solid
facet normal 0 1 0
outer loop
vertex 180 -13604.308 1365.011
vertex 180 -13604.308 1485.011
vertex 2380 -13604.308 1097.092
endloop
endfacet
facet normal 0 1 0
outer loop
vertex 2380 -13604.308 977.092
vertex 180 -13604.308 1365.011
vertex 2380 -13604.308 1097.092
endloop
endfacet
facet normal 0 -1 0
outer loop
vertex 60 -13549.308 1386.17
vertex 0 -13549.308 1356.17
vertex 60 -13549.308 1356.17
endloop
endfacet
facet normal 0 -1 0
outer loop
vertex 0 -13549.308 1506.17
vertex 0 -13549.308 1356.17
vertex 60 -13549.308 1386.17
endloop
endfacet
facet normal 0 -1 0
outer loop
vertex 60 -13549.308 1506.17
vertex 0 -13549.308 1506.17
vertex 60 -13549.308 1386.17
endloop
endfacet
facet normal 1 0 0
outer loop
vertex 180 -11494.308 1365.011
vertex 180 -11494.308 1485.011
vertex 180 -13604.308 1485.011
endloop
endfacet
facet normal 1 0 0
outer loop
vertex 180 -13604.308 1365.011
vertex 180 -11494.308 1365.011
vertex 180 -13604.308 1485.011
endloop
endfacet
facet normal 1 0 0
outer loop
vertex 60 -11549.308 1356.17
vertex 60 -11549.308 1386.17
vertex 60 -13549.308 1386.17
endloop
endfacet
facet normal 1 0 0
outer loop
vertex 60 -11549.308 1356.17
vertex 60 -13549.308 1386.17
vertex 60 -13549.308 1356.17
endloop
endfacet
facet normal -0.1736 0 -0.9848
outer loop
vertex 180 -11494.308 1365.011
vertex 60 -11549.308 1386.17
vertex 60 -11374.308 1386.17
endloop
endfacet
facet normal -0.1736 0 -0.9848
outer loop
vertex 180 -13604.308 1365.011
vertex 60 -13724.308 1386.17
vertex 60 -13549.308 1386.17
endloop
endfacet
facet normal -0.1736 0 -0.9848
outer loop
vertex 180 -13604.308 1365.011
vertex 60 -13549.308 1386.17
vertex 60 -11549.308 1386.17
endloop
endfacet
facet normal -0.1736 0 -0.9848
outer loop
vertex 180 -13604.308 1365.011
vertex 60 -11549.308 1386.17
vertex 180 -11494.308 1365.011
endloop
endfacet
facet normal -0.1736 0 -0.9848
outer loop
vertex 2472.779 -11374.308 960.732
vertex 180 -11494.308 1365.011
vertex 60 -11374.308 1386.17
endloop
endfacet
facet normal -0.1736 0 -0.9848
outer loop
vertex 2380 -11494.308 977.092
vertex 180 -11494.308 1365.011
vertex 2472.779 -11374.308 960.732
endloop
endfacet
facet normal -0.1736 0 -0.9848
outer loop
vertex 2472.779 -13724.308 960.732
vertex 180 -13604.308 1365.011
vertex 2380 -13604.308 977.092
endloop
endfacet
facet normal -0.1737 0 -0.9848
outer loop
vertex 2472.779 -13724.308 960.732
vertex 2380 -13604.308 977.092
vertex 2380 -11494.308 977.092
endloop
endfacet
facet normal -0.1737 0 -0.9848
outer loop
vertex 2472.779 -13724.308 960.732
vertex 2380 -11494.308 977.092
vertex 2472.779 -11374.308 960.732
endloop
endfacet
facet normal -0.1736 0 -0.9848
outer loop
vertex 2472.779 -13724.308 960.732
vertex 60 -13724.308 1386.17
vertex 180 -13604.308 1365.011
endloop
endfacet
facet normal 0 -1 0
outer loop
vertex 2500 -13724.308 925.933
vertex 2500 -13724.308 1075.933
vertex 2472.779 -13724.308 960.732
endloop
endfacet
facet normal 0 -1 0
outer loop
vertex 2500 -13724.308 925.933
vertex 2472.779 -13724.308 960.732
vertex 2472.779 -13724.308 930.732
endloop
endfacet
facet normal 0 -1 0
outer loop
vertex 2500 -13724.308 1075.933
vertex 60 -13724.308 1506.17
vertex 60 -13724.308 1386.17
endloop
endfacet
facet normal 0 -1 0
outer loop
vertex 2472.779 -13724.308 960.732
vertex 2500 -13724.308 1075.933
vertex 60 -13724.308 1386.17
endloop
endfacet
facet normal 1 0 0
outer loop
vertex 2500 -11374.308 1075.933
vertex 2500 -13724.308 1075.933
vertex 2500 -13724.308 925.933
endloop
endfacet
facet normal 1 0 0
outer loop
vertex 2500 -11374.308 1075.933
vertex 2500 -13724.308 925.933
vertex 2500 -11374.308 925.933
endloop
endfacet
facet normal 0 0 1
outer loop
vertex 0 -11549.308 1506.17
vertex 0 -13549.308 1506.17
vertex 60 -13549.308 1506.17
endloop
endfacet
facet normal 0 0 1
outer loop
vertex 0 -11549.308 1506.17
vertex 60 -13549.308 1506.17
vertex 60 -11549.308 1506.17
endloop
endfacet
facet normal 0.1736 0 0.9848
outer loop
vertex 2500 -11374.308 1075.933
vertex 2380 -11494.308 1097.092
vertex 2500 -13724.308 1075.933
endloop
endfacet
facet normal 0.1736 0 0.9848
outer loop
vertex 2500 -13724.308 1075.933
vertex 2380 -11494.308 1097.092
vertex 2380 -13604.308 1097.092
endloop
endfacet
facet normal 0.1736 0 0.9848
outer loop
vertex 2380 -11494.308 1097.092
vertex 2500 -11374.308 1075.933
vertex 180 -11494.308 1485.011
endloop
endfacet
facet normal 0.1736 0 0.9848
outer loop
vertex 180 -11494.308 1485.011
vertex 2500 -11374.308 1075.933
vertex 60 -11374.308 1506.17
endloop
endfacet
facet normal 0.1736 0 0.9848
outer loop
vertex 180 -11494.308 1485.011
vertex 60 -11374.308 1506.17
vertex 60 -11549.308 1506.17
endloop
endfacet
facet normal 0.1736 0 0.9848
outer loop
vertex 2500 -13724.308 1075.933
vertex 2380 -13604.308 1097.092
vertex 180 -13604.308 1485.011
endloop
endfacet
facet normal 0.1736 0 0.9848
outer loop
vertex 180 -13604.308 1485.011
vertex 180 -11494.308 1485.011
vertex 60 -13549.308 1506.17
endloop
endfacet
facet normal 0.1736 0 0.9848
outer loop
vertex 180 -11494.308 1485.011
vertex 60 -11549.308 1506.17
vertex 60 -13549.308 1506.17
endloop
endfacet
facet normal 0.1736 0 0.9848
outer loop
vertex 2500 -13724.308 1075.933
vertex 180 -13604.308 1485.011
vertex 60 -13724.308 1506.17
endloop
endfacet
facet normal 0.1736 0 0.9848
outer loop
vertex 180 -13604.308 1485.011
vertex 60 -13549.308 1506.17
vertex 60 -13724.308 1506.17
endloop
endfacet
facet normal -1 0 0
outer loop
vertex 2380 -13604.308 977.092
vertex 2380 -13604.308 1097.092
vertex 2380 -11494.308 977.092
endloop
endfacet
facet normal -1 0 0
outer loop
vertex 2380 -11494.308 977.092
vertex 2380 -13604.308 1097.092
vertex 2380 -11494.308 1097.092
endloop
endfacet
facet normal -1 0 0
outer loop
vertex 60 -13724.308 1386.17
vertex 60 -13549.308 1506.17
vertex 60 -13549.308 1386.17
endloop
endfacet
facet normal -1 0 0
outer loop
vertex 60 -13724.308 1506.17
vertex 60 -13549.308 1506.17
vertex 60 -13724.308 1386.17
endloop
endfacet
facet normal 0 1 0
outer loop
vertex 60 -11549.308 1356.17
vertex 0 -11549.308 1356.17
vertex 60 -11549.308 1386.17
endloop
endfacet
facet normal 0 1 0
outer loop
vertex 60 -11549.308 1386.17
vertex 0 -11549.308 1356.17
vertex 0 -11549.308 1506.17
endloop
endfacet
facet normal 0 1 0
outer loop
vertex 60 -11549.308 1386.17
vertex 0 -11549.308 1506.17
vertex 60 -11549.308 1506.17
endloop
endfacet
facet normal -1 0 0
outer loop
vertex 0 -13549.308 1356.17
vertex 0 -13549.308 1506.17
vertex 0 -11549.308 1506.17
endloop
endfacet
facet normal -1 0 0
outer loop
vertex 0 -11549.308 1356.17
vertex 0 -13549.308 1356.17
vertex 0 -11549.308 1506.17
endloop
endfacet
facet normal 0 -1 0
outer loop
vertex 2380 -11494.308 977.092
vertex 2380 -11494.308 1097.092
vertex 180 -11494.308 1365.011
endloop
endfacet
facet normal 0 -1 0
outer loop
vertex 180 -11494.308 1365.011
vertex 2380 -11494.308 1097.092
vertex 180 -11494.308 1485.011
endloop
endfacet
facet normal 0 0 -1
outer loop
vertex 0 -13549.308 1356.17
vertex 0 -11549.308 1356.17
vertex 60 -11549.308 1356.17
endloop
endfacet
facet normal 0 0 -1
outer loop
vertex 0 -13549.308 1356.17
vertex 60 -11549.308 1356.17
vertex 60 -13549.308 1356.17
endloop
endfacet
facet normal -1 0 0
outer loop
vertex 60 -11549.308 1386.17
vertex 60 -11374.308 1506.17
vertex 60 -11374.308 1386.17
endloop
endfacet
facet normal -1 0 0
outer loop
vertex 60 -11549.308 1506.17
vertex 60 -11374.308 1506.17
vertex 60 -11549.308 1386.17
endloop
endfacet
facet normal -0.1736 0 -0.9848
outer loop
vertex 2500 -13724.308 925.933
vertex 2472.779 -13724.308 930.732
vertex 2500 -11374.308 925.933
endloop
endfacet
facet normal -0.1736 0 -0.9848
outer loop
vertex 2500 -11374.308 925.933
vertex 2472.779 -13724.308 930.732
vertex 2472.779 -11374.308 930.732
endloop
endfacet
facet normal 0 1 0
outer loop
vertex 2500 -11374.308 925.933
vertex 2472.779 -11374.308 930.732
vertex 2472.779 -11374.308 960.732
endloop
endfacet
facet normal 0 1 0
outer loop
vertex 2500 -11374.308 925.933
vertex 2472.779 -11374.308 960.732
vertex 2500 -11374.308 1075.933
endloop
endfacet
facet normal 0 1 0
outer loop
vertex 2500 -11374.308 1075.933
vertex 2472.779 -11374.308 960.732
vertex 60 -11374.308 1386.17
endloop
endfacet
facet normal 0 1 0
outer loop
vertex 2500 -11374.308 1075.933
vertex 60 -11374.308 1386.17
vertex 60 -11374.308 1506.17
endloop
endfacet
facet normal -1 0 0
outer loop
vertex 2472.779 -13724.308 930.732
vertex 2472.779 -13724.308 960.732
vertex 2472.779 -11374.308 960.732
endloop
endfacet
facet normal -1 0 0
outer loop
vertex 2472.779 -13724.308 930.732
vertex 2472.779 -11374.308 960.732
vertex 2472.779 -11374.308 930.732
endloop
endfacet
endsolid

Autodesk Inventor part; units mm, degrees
sketch "Sketch1" plane through (0, 0, 0) normal (1, 0, 0) x (0, 1, 0)
  line L0 (-11549.3083, -1493.8295) -> (-11549.3083, 1506.1705)
  line L1 (-13549.3083, -1493.8295) -> (-13549.3083, 1506.1705)
  line L2 (-13724.3083, 1506.1705) -> (-13724.3083, -1493.8295)
  line L3 (-13724.3083, 1506.1705) -> (-11374.3083, 1506.1705)
  line L4 (-11374.3083, 1506.1705) -> (-11374.3083, -1493.8295)
  line L5 (-13724.3083, 1506.1705) -> (-11374.3083, 1506.1705)
  line L6 (-11374.3083, 1506.1705) -> (-11374.3083, 1356.1705)
  line L7 (-11374.3083, 1356.1705) -> (-13724.3083, 1356.1705)
  line L8 (-13724.3083, 1356.1705) -> (-13724.3083, 1506.1705)
  point P0 (0, 0)
  point P1 (-13549.3083, 1506.1705)
  dimension "d2" = 150
ref_plane "Work Plane2" through (2500, 0, 0) normal (1, 0, 0) x (0, 1, 0)
ref_plane "Work Plane1" through (0, 0, 0) normal (1, 0, 0) x (0, 1, 0)
extrude "Extrusion1" add sketch "Sketch1" along normal blind 60
sketch "Sketch2" plane through (60, 0, 0) normal (1, 0, 0) x (0, 0, -1)
  point P0 (0, 0)
ref_plane "Work Plane3" through (60, 0, 0) normal (1, 0, 0) x (0, 0, -1)
sketch "Sketch3" plane through (2500, 0, 0) normal (1, 0, 0) x (0, 1, 0)
  line L0 (-11374.3083, 1506.1705) -> (-11374.3083, -1493.8295) projected
  line L1 (-13724.3083, 1506.1705) -> (-13724.3083, -1493.8295) projected
  point P0 (0, 0)
ref_plane "Work Plane4" through (0, -13724.3083, 1506.1705) normal (0, -1, 0) x (0, 0, -1)
sketch "Sketch4" plane through (0, -13724.3083, 1506.1705) normal (0, -1, 0) x (0, 0, -1)
  line L0 (0, 60) -> (150, 60) projected
  line L1 (0, 2500) -> (3000, 2500) projected
  line L2 (0, 60) -> (430.2378, 2500)
  line L3 (0, 60) -> (2477.6409, 60) construction
  line L4 (150, 60) -> (580.2378, 2500)
  line L5 (150, 60) -> (2627.6409, 60) construction
  line L6 (580.2378, 2500) -> (430.2378, 2500)
  line L7 (0, 60) -> (150, 60)
  point P0 (1506.1705, 0)
  dimension "d6" = 80
  dimension "d7" = 80
sketch "Sketch5" plane through (2500, 0, 0) normal (1, 0, 0) x (0, 1, 0)
  line L0 (-13724.3083, 1506.1705) -> (-13724.3083, -1493.8295) projected
  line L1 (-11374.3083, 1506.1705) -> (-11374.3083, -1493.8295) projected
  line L2 (-13724.3083, 1075.9326) -> (-11374.3083, 1075.9326)
  line L3 (-11374.3083, 1075.9326) -> (-11374.3083, 925.9326)
  line L4 (-11374.3083, 925.9326) -> (-13724.3083, 925.9326)
  line L5 (-13724.3083, 925.9326) -> (-13724.3083, 1075.9326)
  point P0 (0, 0)
loft "Loft1" add profiles "Sketch5" section 2 edges at (60, -11374.3083, 1431.1705) (60, -12549.3083, 1506.1705) (60, -13724.3083, 1431.1705) (60, -12549.3083, 1356.1705)
sketch "Sketch6" plane through (0, -13724.3083, 1506.1705) normal (0, 0, 1) x (1, 0, 0)
  line L0 (60, 2350) -> (60, 0) projected
  line L1 (0, 2175) -> (60, 2175)
  line L2 (60, 2175) -> (60, 2350)
  line L3 (60, 2350) -> (0, 2350)
  line L4 (0, 2350) -> (0, 2175)
  line L5 (0, 175) -> (60, 175)
  line L6 (60, 175) -> (60, 0)
  line L7 (60, 0) -> (0, 0)
  line L8 (0, 0) -> (0, 175)
  point P0 (0, 13724.3083)
extrude "Extrusion2" cut sketch "Sketch6" against normal through all
sketch "Sketch7" plane through (0, -13724.3083, 1506.1705) normal (0, -1, 0) x (0, 0, -1)
  line L0 (0, 60) -> (150, 60) projected
  line L1 (150, 60) -> (575.438, 2472.779)
  line L2 (150, 0) -> (150, 60) projected
  line L3 (150, 60) -> (120, 60)
  line L4 (120, 60) -> (545.438, 2472.779)
  line L5 (545.438, 2472.779) -> (575.438, 2472.779)
  line L6 (430.2378, 2500) -> (580.2378, 2500) projected
  point P0 (1506.1705, 0)
  dimension "d15" = 2450
  dimension "d16" = 30
  dimension "d17" = 2450
extrude "Extrusion3" cut sketch "Sketch7" against normal through all
sketch "Sketch8" plane through (0, 0, 0) normal (-1, 0, 0) x (0, 0, 1)
  point P0 (0, 0)
sketch "Sketch9" plane through (0, -13549.3083, 1506.1705) normal (0, 0, 1) x (1, 0, 0)
  line L0 (2500, -175) -> (2500, 2175) projected
  line L1 (2500, 2175) -> (60, 2175) projected
  line L2 (60, 2175) -> (60, 2000) projected
  line L3 (60, 2000) -> (60, 0) projected
  line L4 (60, 0) -> (60, -175) projected
  line L5 (2500, -175) -> (60, -175) projected
  line L6 (60, -175) -> (180, -175)
  line L7 (180, -175) -> (180, -55)
  line L8 (180, -55) -> (60, -55)
  line L9 (60, -55) -> (60, -175)
  line L10 (2500, 2175) -> (2380, 2175)
  line L11 (2380, 2175) -> (2380, 2055)
  line L12 (2380, 2055) -> (2500, 2055)
  line L13 (2500, 2055) -> (2500, 2175)
  line L14 (2380, 2055) -> (180, 2055)
  line L15 (180, 2055) -> (180, -55)
  line L16 (180, -55) -> (2380, -55)
  line L17 (2380, -55) -> (2380, 2055)
  point P0 (0, 13549.3083)
  dimension "d20" = 120
  dimension "d21" = 120
  dimension "d22" = 120
  dimension "d23" = 120
extrude "Extrusion4" cut sketch "Sketch9" against normal through all contours L17 L16 L15 L14
properties part number "eave_frame_side" material "Wood (Maple)"
